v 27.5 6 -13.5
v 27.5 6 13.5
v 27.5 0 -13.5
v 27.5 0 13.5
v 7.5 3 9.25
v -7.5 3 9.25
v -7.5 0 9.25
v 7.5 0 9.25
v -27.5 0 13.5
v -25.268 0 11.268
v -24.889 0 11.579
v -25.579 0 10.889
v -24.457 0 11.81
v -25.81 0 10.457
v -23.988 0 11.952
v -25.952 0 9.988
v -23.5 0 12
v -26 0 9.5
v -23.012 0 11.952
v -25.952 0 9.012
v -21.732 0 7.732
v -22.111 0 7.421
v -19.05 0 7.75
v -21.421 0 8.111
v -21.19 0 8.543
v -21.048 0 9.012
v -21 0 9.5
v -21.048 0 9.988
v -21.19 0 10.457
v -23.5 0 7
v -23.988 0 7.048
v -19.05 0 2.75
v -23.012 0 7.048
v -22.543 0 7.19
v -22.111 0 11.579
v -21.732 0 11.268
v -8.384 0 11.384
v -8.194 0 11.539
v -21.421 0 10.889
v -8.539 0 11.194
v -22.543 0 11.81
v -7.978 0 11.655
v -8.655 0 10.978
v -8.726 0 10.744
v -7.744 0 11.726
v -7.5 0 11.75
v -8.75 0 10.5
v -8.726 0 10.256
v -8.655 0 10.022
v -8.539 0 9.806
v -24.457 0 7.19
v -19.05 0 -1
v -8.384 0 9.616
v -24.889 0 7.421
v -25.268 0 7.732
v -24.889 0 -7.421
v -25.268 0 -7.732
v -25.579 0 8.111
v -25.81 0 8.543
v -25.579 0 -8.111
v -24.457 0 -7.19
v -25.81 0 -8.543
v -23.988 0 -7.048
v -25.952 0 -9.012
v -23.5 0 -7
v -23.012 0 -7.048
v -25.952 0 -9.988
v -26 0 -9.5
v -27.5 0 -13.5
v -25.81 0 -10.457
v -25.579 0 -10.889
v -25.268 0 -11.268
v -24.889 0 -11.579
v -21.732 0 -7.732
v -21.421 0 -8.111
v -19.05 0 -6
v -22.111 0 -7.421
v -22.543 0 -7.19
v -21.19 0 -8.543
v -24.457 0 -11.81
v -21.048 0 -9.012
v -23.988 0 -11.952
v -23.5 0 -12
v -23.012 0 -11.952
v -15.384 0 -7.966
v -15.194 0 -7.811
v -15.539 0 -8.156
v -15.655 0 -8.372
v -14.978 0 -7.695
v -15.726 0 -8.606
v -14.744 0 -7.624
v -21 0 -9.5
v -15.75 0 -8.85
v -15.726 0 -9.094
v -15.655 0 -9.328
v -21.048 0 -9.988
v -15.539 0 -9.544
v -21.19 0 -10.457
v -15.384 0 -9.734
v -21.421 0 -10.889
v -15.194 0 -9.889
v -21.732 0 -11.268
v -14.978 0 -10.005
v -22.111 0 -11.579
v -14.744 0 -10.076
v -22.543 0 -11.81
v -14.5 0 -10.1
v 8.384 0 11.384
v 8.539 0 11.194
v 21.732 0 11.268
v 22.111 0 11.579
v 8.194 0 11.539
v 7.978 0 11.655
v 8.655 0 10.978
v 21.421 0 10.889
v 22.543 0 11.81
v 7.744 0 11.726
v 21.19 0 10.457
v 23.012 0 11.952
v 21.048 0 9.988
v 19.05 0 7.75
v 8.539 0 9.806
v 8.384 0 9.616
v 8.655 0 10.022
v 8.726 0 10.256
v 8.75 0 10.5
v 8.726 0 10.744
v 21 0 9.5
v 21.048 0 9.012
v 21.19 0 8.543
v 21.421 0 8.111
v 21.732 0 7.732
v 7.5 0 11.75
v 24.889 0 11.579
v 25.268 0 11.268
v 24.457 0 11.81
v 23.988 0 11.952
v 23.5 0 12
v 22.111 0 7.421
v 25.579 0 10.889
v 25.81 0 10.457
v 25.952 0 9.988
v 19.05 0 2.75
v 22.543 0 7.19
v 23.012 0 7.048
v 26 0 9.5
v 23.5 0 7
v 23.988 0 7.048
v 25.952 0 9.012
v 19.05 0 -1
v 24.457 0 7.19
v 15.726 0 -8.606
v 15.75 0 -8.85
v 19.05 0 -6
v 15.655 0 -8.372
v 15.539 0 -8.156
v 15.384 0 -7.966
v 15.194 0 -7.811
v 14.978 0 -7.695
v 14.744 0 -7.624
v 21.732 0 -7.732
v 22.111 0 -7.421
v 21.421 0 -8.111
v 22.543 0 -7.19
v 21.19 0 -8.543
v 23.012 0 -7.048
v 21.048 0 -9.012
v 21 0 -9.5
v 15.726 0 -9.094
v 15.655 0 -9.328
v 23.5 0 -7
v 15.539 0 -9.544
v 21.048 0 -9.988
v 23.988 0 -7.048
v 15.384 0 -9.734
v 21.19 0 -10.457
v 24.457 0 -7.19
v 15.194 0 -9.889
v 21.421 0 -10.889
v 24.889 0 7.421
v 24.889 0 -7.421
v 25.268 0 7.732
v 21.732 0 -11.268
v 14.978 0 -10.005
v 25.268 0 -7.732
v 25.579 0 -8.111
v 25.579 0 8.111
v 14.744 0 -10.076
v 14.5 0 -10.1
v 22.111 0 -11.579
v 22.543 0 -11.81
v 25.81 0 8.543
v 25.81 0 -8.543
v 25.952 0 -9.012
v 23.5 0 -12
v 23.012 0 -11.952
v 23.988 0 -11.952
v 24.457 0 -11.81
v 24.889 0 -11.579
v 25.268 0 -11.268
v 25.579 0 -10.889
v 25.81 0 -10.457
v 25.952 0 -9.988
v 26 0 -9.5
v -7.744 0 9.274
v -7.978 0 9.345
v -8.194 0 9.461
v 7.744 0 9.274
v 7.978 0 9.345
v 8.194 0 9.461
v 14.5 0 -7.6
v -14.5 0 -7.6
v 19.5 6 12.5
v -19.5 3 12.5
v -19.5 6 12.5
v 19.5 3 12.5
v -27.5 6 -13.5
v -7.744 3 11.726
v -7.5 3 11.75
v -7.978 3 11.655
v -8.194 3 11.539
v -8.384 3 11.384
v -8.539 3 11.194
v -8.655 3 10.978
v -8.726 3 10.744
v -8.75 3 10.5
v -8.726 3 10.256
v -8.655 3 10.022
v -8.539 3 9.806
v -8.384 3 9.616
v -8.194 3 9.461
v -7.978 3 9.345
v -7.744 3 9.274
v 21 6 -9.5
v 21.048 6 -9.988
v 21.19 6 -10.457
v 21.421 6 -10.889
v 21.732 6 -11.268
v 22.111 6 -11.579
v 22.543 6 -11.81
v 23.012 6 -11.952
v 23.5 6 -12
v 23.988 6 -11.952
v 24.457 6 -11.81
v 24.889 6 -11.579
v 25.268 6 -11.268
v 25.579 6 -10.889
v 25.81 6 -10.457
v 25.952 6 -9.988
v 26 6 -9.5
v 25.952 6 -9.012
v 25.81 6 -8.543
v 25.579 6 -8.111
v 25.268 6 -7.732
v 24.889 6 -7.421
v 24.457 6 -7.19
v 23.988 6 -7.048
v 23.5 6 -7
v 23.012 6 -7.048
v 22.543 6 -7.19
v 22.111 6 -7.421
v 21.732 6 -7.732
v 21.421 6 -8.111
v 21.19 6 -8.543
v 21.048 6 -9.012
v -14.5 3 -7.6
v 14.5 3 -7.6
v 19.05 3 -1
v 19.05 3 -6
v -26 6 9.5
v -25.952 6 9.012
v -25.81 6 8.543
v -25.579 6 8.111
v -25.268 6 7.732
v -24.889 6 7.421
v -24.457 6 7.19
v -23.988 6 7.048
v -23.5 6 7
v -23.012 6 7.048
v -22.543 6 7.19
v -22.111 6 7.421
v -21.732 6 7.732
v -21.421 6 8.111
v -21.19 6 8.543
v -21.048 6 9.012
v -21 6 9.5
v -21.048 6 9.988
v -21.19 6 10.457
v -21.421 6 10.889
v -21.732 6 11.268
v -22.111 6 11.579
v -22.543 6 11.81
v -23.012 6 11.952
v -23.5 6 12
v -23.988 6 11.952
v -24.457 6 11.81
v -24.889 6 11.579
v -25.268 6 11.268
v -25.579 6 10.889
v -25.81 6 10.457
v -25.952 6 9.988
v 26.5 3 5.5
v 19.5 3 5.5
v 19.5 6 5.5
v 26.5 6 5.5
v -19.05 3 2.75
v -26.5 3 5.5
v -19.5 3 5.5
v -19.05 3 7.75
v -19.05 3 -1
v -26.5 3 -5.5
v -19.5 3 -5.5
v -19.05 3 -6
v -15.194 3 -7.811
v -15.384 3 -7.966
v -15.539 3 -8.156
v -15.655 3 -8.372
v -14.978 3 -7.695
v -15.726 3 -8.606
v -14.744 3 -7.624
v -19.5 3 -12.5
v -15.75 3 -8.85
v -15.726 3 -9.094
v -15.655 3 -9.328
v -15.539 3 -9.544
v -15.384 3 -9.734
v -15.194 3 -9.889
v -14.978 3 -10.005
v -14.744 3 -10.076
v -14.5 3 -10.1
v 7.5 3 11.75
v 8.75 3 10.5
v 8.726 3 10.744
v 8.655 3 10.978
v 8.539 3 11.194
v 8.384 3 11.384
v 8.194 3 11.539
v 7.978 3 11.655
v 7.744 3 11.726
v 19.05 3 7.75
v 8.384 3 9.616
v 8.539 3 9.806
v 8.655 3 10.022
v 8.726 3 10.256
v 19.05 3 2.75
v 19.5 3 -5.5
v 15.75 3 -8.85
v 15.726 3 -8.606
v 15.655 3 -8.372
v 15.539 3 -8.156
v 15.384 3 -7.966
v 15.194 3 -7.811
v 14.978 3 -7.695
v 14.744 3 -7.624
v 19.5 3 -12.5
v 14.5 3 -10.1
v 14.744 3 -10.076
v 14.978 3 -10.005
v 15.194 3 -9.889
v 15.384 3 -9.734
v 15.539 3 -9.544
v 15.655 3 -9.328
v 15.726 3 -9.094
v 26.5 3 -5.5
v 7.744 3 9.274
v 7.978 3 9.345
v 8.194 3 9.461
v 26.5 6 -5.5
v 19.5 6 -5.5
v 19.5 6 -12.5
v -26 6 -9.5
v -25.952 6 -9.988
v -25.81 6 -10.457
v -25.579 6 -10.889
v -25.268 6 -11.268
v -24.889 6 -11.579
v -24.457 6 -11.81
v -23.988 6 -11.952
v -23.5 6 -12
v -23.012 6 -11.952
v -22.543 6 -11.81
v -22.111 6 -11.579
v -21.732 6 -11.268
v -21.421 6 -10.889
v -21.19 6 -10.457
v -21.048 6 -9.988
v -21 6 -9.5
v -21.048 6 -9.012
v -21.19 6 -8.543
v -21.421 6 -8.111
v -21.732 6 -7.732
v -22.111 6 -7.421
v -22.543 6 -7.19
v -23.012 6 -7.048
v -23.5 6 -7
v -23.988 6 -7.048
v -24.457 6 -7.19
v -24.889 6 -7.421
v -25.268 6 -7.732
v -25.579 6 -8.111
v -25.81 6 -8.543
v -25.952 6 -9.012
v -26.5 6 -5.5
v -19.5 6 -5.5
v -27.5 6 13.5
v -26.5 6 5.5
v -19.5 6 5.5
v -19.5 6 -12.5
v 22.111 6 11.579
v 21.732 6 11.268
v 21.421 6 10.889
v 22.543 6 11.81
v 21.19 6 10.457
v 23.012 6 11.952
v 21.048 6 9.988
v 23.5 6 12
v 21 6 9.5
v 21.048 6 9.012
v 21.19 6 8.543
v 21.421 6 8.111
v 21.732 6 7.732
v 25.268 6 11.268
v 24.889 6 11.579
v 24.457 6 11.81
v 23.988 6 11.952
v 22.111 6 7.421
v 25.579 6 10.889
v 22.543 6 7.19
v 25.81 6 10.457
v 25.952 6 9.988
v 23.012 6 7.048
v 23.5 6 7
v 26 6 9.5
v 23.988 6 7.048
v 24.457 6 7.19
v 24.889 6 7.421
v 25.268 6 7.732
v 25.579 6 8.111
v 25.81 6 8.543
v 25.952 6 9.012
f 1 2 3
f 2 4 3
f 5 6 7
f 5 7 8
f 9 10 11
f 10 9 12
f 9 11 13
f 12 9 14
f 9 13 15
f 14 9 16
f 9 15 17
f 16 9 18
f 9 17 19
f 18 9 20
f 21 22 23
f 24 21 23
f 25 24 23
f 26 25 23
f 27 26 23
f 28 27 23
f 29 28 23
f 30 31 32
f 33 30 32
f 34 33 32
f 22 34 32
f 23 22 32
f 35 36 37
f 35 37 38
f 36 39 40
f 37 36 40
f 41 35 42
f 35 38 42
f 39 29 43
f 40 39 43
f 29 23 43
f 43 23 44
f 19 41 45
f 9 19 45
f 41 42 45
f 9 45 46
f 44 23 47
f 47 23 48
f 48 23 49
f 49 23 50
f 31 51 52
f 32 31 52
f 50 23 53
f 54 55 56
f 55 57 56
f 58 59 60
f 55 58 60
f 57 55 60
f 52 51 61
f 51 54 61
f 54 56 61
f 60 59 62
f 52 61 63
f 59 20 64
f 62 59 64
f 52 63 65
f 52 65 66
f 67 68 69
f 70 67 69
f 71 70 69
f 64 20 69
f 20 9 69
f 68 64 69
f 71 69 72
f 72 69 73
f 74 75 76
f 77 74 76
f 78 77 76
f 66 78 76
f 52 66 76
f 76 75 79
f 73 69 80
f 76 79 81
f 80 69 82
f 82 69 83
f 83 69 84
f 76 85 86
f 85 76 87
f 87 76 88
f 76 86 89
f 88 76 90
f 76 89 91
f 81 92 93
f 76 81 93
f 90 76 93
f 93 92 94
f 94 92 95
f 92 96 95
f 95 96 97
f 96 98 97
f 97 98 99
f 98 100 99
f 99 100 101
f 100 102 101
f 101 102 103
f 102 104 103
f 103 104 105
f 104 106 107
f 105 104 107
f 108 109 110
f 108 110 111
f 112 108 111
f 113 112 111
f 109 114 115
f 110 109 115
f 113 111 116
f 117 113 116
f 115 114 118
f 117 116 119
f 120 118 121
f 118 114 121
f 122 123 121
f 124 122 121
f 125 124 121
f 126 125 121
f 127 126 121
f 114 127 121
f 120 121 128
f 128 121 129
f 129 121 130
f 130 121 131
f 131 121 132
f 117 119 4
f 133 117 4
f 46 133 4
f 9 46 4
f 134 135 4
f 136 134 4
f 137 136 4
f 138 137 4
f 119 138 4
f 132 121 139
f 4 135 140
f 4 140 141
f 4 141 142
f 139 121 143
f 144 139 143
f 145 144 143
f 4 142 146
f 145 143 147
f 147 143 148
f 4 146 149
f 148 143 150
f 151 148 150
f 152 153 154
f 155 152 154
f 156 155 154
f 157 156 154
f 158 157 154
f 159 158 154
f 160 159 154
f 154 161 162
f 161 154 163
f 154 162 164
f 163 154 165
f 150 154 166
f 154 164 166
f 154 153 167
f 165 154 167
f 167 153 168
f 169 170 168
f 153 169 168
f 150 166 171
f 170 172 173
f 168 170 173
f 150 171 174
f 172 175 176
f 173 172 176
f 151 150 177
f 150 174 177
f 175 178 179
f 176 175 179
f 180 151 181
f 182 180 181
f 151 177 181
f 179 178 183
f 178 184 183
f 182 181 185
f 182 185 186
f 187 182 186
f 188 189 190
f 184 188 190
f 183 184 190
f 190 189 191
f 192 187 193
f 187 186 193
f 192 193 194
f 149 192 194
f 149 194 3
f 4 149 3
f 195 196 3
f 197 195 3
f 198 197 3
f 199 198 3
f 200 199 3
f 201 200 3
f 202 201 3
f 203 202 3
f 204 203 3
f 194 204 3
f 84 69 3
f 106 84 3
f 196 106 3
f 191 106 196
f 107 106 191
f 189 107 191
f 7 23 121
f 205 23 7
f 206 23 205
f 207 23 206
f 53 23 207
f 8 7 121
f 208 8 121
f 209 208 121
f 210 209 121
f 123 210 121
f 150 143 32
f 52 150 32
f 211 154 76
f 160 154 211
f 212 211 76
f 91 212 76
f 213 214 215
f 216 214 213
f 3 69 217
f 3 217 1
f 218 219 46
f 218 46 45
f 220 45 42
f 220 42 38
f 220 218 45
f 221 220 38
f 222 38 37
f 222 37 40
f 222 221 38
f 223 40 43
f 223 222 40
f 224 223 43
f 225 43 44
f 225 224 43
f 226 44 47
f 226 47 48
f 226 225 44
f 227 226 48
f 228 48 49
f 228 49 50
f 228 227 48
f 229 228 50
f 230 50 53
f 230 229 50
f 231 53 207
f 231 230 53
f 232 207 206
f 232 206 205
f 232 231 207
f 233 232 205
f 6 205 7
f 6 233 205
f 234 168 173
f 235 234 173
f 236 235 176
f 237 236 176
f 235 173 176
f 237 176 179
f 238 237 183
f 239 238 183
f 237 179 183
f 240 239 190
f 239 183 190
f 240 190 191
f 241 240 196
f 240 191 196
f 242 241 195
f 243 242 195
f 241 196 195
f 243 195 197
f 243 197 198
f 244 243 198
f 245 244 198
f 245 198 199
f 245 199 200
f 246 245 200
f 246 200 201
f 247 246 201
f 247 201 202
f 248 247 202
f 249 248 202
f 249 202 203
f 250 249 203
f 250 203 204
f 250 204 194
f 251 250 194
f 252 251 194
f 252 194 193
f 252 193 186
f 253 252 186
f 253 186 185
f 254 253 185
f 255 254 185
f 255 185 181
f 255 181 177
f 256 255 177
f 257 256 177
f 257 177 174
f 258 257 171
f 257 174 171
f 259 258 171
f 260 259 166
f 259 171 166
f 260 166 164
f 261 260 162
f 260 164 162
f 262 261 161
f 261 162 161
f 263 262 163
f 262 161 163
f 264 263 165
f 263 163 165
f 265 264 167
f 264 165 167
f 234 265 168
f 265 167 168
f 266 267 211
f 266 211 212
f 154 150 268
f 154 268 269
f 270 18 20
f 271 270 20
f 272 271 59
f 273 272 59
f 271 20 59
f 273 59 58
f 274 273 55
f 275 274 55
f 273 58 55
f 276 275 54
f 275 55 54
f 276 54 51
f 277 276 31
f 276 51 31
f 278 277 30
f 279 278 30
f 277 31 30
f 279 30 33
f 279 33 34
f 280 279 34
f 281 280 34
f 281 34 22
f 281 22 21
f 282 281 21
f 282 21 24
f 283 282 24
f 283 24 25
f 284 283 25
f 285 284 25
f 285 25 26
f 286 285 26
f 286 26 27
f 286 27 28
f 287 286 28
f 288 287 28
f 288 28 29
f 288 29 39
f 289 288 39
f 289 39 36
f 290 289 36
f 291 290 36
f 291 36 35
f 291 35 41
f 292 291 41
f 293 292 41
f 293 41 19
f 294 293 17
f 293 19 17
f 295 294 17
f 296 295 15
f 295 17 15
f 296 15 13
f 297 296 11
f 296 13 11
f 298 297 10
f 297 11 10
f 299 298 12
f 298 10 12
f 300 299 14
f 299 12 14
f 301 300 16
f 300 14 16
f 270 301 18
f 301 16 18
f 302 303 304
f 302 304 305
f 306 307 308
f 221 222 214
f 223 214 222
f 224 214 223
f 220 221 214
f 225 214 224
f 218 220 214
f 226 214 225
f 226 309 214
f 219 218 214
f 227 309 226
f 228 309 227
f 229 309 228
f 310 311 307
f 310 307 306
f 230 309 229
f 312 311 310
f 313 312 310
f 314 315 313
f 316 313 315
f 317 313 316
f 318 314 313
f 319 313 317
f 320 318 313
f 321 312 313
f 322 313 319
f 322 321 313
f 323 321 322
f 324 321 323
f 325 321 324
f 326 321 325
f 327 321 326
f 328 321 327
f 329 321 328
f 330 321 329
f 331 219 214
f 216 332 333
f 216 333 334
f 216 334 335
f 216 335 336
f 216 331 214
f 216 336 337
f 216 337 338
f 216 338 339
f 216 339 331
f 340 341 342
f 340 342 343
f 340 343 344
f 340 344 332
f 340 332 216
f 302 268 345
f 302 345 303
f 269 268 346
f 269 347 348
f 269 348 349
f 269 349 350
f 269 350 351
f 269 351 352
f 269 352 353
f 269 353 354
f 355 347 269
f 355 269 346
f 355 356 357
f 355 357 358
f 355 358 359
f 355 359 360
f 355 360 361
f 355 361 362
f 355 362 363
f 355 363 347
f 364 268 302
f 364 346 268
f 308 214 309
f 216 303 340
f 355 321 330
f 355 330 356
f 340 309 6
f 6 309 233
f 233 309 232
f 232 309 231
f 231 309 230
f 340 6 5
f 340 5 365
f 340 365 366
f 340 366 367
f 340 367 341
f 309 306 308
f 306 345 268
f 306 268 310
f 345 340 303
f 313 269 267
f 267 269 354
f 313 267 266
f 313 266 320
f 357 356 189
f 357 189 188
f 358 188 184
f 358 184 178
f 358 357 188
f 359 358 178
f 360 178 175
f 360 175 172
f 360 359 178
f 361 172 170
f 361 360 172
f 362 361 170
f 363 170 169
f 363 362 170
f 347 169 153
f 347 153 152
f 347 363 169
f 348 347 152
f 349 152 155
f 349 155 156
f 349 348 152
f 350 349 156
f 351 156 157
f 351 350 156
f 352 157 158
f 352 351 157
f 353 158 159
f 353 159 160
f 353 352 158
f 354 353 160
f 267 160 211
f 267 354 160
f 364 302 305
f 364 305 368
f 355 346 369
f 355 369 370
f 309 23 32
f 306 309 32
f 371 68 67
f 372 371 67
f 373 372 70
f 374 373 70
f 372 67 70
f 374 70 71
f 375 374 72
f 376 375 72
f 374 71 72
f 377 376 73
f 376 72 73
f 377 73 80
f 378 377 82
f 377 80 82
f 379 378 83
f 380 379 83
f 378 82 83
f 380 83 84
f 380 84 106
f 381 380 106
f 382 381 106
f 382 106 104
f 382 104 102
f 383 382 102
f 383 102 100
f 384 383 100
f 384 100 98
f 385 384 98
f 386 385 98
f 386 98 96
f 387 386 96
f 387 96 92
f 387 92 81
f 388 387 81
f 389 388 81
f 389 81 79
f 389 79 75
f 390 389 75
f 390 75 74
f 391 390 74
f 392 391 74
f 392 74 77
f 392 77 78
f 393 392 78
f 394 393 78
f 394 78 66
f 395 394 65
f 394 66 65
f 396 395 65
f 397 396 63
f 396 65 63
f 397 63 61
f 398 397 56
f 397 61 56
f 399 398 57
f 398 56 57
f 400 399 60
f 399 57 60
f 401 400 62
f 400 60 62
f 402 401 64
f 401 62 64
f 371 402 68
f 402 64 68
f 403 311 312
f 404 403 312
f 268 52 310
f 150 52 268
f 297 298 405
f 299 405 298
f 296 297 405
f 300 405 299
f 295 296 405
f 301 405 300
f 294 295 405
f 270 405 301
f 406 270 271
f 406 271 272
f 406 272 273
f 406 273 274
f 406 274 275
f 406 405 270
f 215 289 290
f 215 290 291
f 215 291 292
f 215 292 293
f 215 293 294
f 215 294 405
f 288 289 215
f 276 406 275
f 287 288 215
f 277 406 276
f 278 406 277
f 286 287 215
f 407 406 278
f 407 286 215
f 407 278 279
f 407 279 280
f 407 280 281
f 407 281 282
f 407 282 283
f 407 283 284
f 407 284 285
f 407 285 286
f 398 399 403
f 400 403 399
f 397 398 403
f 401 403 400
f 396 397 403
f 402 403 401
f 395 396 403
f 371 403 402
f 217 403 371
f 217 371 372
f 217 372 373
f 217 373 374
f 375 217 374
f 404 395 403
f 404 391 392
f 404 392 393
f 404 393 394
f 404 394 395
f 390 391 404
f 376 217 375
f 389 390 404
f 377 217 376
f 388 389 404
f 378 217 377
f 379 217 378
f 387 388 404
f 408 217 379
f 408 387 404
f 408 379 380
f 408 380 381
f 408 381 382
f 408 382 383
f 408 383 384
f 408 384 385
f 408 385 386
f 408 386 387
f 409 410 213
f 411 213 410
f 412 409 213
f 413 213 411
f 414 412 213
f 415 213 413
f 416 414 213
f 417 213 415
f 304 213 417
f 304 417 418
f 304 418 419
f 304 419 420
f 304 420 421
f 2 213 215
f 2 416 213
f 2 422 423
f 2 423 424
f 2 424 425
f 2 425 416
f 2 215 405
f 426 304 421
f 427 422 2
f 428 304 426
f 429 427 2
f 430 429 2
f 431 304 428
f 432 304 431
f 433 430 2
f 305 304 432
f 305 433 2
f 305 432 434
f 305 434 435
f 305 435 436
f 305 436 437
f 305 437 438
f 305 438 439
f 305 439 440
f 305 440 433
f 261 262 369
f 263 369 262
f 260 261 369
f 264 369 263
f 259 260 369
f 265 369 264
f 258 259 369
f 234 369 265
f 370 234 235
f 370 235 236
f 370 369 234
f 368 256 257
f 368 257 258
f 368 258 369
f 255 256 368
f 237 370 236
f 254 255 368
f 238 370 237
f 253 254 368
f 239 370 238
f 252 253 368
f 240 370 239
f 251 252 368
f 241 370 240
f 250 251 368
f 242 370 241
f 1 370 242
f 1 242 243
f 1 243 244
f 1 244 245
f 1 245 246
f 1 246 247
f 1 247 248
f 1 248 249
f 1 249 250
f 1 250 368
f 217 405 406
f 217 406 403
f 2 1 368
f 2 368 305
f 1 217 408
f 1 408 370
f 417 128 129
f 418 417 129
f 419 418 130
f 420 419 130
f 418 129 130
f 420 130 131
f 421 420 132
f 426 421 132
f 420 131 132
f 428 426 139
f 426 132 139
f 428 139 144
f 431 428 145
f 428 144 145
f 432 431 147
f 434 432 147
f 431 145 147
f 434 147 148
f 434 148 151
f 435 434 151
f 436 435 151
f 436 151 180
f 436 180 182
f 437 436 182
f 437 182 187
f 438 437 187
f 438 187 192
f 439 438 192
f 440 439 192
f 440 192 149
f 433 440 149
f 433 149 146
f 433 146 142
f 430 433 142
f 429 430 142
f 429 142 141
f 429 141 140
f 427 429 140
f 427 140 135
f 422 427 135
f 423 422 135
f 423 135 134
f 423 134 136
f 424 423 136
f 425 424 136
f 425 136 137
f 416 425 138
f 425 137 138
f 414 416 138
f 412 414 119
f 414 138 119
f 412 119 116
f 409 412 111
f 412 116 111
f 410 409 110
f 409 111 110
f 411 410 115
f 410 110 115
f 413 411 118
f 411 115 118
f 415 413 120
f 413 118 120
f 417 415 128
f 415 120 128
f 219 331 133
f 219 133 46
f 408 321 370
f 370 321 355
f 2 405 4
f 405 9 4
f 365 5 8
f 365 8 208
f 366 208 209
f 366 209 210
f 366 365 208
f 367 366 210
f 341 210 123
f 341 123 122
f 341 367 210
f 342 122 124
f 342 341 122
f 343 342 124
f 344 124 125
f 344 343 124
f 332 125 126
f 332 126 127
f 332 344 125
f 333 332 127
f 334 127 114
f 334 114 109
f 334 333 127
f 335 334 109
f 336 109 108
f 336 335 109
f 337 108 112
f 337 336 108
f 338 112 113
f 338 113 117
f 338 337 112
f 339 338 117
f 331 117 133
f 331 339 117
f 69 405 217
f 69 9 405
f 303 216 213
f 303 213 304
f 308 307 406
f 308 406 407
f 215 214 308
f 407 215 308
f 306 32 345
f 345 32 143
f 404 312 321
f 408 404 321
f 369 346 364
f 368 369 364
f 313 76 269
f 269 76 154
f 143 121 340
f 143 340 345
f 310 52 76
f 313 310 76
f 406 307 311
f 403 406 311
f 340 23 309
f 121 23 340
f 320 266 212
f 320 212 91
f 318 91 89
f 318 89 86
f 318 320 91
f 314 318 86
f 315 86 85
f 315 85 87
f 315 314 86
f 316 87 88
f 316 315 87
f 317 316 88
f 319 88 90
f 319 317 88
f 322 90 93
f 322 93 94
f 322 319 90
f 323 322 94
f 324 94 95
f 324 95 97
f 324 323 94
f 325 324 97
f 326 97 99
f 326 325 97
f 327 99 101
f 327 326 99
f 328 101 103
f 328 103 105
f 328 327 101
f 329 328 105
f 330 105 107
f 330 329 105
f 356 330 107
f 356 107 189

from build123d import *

# Parameters (mm, degrees)
SKETCH1_W                   = 55
SKETCH1_H                   = 27
SKETCH1_W_2                 = 38.1
SKETCH1_H_2                 = 5
BOTTOM_BASE_DEPTH           = 3
SENSOR_MOUNTING_HOLES_DEPTH = 3
SKETCH4_W                   = 55
SKETCH4_H                   = 27
SKETCH4_W_2                 = 53
SKETCH4_H_2                 = 25
SKETCH4_W_3                 = 7
SKETCH4_H_3                 = 7
OUTER_RIM_DEPTH             = 3
M4_BOLT_HOLES_D             = 5
BACKWARDS_SENSOR_DEPTH      = 3


with BuildPart() as part:
    # Sketch1 → Bottom Base (new body)
    with BuildSketch(Plane(origin=(0, 0, 0), x_dir=(1, 0, 0), z_dir=(0, 1, 0))):
        Rectangle(SKETCH1_W, SKETCH1_H)
        with Locations((0, -5.25)):
            Rectangle(SKETCH1_W_2, SKETCH1_H_2, mode=Mode.SUBTRACT)
        with Locations((0, 3.5)):
            Rectangle(SKETCH1_W_2, SKETCH1_H_2, mode=Mode.SUBTRACT)
    extrude(amount=BOTTOM_BASE_DEPTH)

    # Sketch3 → Sensor Mounting Holes (cut)
    with BuildSketch(Plane(origin=(0, 3, 0), x_dir=(1, 0, 0), z_dir=(0, 1, 0))):
        with BuildLine():
            Line((-14.5, 10.1), (14.500000132, 10.1))
            ThreePointArc((14.500000132, 10.1), (15.750000132, 8.85), (14.500000132, 7.6))
            Line((14.500000132, 7.6), (-14.5, 7.6))
            ThreePointArc((-14.5, 7.6), (-15.75, 8.85), (-14.5, 10.1))
        make_face()
    extrude(amount=-SENSOR_MOUNTING_HOLES_DEPTH, mode=Mode.SUBTRACT)

    # Sketch4 → Outer Rim (add)
    with BuildSketch(Plane(origin=(0, 3, 0), x_dir=(1, 0, 0), z_dir=(0, 1, 0))):
        Rectangle(SKETCH4_W, SKETCH4_H)
        Rectangle(SKETCH4_W_2, SKETCH4_H_2, mode=Mode.SUBTRACT)
        with Locations((23, 9)):
            Rectangle(SKETCH4_W_3, SKETCH4_H_3)
        with Locations((23, -9)):
            Rectangle(SKETCH4_W_3, SKETCH4_H_3)
        with Locations((-23, -9)):
            Rectangle(SKETCH4_W_3, SKETCH4_H_3)
        with Locations((-23, 9)):
            Rectangle(SKETCH4_W_3, SKETCH4_H_3)
    extrude(amount=OUTER_RIM_DEPTH)

    # M4 bolt holes (through all)
    with Locations(Plane(origin=(0, 6, 0), x_dir=(1, 0, 0), z_dir=(0, 1, 0))):
        with Locations((-23.5, 9.5), (-23.5, -9.5), (23.5, 9.5), (23.5, -9.5)):
            Hole(M4_BOLT_HOLES_D / 2)

    # Sketch11 → backwards sensor (cut)
    with BuildSketch(Plane(origin=(0, 3, 0), x_dir=(1, 0, 0), z_dir=(0, 1, 0))):
        with BuildLine():
            Line((-7.5, -9.25), (7.5, -9.25))
            ThreePointArc((7.5, -9.25), (8.75, -10.5), (7.5, -11.75))
            Line((7.5, -11.75), (-7.5, -11.75))
            ThreePointArc((-7.5, -11.75), (-8.75, -10.5), (-7.5, -9.25))
        make_face()
    extrude(amount=-BACKWARDS_SENSOR_DEPTH, mode=Mode.SUBTRACT)


solid = part.part
